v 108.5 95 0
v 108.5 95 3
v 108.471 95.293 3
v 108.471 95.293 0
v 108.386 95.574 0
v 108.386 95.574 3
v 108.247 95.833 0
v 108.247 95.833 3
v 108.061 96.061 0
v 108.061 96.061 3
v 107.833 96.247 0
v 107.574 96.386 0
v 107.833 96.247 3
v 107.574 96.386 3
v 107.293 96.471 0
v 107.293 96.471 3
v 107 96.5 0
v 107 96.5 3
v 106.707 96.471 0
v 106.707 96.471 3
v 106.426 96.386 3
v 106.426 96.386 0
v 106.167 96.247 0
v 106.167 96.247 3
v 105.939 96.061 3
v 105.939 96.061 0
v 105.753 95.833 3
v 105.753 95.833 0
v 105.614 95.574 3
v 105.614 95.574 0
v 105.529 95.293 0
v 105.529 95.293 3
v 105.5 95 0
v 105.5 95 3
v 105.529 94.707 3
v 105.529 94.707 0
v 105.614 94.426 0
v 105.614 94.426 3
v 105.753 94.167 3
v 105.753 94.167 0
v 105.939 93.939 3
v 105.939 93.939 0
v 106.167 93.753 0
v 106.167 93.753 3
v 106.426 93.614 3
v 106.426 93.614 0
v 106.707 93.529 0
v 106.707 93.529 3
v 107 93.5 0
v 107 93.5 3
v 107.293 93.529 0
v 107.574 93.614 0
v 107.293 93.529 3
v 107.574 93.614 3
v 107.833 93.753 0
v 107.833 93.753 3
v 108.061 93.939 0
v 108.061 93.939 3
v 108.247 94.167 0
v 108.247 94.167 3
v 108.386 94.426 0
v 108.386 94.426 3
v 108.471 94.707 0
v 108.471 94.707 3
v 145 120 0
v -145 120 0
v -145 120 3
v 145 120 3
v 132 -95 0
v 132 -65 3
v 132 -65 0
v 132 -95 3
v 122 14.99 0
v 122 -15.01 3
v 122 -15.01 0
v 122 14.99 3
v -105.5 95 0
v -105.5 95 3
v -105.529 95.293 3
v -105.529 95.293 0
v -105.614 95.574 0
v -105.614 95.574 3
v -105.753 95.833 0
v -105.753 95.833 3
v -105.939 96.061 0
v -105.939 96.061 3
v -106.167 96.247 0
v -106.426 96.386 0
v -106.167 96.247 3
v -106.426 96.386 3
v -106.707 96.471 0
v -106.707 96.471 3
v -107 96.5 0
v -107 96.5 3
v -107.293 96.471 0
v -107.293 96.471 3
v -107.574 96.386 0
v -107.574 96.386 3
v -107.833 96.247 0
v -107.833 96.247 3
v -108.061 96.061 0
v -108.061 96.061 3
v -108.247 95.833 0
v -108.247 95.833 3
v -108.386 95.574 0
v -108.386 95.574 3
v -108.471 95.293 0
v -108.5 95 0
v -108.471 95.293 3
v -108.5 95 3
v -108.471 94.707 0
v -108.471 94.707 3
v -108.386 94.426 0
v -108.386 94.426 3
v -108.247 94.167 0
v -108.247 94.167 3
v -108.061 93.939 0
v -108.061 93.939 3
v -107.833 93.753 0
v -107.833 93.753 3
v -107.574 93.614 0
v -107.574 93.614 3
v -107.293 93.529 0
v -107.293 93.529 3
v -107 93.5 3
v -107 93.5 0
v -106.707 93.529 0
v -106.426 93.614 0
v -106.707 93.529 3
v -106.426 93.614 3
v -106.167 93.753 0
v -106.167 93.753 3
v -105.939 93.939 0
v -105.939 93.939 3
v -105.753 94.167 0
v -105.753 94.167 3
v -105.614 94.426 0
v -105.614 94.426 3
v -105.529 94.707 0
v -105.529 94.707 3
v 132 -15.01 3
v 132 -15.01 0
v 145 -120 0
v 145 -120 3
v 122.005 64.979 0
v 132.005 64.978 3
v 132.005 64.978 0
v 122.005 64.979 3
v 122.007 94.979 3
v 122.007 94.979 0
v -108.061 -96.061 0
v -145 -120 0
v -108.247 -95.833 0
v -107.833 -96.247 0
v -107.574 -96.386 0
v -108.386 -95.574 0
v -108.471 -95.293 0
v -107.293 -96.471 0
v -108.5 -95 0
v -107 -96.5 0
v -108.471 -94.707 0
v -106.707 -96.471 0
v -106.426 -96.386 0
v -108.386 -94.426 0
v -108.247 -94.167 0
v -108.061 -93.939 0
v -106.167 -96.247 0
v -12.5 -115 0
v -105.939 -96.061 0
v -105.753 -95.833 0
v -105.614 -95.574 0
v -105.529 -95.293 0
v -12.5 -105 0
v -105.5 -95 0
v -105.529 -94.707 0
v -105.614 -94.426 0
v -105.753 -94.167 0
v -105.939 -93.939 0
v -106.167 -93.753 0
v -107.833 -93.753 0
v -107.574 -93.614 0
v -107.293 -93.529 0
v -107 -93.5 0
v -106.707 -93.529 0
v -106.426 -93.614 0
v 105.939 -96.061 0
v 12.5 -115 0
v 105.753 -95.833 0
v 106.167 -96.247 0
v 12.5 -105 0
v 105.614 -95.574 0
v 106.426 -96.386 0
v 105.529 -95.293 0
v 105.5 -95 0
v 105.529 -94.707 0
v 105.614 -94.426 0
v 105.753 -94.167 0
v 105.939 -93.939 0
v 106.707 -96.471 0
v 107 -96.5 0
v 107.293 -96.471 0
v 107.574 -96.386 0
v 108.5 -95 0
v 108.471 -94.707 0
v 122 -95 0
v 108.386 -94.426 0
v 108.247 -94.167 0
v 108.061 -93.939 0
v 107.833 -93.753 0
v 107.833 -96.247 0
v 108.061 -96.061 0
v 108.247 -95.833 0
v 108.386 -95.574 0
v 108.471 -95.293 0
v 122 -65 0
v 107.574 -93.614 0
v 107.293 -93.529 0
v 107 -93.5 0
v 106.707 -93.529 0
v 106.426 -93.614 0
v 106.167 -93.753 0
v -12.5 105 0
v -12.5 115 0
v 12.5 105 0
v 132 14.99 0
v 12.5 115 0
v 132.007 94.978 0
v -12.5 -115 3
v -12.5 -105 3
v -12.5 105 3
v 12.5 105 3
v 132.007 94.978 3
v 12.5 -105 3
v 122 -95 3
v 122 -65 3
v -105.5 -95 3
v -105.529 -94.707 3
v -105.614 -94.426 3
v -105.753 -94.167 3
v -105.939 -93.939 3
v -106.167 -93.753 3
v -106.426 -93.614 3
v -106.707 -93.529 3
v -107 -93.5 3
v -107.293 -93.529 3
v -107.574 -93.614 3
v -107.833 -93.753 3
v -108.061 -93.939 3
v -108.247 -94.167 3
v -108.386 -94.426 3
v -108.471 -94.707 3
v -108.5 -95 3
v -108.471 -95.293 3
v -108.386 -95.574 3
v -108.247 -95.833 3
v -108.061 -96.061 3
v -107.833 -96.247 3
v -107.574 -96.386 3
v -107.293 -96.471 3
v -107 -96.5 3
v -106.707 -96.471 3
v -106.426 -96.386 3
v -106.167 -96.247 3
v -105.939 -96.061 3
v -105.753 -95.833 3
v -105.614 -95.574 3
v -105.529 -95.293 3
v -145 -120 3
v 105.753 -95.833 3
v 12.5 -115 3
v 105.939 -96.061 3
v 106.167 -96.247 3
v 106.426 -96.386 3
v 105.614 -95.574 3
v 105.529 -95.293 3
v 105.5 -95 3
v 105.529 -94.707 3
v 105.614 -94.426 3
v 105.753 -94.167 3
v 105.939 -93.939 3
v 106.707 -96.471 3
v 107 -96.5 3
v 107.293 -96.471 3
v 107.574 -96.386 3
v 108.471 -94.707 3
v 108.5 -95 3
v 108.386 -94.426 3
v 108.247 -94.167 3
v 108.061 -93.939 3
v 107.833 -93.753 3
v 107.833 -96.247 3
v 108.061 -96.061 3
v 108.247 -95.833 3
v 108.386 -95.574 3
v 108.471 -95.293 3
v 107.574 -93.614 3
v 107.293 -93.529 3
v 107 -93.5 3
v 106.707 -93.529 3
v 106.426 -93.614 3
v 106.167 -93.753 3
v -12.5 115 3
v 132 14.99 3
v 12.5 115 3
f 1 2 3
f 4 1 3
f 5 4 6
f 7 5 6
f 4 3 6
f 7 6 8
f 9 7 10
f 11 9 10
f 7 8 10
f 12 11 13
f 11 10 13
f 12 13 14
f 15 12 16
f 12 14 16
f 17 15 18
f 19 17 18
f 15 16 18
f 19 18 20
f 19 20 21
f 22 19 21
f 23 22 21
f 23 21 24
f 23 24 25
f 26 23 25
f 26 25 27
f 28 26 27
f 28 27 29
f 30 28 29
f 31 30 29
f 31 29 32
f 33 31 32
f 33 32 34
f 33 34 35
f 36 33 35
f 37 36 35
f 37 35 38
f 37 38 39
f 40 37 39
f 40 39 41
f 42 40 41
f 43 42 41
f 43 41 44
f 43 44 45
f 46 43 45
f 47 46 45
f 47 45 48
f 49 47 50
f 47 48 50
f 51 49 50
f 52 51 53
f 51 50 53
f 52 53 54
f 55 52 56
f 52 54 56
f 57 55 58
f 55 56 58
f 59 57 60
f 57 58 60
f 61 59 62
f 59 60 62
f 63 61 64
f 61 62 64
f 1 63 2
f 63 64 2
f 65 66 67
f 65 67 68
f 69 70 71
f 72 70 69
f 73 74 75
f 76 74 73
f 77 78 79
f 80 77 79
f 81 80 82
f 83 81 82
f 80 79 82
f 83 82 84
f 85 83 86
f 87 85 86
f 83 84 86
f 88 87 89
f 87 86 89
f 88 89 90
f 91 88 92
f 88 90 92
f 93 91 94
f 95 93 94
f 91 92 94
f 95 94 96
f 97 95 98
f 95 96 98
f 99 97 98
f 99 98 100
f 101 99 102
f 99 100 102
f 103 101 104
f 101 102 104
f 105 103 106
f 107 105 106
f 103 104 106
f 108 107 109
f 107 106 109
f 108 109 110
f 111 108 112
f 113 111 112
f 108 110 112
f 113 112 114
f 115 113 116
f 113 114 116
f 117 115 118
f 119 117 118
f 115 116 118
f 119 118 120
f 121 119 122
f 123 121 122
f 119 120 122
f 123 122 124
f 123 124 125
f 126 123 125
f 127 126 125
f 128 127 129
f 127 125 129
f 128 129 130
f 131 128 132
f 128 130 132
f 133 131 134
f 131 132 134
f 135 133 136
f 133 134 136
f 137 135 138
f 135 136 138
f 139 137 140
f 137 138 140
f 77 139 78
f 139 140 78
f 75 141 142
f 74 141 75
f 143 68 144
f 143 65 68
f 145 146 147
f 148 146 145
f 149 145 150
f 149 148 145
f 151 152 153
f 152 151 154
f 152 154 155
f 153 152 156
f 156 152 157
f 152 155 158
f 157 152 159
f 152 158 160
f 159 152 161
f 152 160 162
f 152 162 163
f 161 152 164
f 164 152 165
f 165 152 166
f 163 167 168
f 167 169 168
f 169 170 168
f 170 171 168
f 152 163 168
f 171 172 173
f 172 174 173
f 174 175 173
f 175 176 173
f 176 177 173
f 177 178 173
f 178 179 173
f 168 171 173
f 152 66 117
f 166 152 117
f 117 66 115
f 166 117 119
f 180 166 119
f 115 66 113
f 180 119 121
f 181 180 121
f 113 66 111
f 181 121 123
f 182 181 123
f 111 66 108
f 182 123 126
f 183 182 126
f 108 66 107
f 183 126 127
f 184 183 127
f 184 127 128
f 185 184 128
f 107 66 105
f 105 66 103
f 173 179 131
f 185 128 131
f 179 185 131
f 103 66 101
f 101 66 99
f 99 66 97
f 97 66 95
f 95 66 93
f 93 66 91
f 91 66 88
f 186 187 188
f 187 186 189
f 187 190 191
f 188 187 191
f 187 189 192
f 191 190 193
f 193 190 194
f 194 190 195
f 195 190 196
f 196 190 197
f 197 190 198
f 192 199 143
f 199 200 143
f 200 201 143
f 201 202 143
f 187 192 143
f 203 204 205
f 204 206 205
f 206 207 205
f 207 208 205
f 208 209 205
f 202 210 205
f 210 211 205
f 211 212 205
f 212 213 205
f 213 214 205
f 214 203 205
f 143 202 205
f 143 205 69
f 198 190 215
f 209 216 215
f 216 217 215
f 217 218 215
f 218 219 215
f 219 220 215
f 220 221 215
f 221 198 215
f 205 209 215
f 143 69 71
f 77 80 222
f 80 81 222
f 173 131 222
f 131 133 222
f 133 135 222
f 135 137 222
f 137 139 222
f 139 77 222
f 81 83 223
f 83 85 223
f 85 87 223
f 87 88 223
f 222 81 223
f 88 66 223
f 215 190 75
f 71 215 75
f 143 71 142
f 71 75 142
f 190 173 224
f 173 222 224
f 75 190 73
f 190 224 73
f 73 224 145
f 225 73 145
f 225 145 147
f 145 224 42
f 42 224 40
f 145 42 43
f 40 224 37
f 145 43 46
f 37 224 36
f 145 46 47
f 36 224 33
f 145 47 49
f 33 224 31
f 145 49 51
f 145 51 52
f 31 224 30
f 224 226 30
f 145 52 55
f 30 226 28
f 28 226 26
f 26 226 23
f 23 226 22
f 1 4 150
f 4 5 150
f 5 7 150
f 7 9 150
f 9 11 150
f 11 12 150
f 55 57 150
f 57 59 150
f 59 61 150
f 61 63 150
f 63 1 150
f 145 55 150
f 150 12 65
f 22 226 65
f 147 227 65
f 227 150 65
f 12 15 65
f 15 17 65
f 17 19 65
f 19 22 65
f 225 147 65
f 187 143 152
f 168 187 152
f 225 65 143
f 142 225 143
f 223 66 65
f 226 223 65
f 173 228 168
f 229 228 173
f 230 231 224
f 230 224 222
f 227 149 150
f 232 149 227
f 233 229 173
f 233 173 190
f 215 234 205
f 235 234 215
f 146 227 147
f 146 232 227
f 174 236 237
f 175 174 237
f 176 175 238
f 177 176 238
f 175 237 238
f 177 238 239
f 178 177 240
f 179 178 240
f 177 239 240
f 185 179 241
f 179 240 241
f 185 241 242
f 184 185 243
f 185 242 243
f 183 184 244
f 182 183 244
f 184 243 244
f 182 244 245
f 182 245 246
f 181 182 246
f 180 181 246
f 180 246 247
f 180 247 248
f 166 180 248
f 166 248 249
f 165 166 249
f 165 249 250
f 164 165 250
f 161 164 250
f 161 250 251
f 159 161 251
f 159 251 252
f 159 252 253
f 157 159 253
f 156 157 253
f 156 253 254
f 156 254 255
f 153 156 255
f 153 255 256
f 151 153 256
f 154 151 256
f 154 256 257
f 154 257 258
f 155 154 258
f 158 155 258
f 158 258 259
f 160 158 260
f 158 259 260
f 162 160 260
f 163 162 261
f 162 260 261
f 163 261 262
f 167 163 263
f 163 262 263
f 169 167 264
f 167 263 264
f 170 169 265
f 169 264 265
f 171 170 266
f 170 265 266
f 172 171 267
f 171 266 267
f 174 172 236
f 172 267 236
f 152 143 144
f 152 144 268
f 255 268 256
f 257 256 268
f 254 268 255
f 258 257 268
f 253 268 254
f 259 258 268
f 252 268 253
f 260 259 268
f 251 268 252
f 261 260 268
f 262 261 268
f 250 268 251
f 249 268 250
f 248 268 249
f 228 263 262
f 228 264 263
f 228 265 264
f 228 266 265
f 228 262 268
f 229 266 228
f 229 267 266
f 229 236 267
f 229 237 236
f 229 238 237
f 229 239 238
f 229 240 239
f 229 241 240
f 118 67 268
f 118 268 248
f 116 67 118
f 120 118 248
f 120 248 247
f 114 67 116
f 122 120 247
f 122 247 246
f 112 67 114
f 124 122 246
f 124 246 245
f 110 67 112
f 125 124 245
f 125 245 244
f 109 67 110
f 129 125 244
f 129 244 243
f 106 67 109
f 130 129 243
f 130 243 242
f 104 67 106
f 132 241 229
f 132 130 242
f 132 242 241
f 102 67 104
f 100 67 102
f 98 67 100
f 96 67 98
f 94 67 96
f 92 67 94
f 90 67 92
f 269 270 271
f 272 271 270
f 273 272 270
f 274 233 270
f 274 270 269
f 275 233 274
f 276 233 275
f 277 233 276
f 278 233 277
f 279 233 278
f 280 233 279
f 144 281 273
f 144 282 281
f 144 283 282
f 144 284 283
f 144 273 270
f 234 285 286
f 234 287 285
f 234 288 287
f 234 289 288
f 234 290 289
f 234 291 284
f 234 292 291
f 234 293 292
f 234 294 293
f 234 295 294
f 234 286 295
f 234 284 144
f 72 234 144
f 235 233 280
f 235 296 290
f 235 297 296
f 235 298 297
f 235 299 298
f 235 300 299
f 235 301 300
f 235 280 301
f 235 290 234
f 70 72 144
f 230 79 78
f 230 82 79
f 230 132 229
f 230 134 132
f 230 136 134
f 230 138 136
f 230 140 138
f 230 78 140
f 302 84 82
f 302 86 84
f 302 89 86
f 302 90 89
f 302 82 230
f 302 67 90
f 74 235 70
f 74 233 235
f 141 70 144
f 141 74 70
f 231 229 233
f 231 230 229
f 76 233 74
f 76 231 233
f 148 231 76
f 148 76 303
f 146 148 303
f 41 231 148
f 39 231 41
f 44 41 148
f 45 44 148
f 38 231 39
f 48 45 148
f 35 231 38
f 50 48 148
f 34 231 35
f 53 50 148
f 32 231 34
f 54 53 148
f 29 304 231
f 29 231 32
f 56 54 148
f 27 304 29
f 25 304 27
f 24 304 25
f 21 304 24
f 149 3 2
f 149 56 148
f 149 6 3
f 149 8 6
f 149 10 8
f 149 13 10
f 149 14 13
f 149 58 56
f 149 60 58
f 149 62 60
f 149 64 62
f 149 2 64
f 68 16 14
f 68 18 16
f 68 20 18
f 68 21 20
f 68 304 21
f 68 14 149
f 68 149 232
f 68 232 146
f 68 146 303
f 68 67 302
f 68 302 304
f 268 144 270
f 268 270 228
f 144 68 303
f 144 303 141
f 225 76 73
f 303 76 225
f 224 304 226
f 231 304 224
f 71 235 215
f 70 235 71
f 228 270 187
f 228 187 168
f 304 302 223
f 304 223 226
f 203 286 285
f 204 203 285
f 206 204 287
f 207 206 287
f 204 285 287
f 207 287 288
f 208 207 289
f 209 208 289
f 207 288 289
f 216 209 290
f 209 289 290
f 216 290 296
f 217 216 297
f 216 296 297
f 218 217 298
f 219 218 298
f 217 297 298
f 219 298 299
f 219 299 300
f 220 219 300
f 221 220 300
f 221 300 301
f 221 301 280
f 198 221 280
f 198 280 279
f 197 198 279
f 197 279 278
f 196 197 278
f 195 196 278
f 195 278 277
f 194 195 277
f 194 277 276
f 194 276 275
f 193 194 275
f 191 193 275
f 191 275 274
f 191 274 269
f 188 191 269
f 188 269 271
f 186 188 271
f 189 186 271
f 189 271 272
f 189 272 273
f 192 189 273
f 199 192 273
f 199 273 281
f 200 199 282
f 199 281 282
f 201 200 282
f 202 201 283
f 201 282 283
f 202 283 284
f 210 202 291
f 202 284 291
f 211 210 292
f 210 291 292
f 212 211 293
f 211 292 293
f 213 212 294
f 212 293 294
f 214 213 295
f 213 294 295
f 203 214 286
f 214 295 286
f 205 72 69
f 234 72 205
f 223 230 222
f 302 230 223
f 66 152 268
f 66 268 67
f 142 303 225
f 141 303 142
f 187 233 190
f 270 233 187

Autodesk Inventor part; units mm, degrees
ref_plane "YZ Plane" through (0, 0, 0) normal (1, 0, 0) x (0, 1, 0)
ref_plane "XZ Plane" through (0, 0, 0) normal (0, 1, 0) x (-1, 0, 0)
ref_plane "XY Plane" through (0, 0, 0) normal (0, 0, 1) x (1, 0, 0)
sketch "Эскиз1" plane through (0, 0, 0) normal (0, 0, 1) x (1, 0, 0)
  line L0 (-145, 120) -> (145, 120)
  line L1 (145, 120) -> (145, -120)
  line L2 (145, -120) -> (-145, -120)
  line L3 (-145, -120) -> (-145, 120)
  line L4 (-145, 120) -> (145, -120) construction
  line L5 (145, 120) -> (-145, -120) construction
  point P0 (0, 0)
  dimension "d0" = 240
  dimension "d1" = 290
extrude "Пластина1" add sketch "Эскиз1" along normal blind 3
sketch "Эскиз2" plane through (0, 0, 3) normal (0, 0, 1) x (1, 0, 0)
  line L0 (12.5, 105) -> (-12.5, 105) projected
  line L1 (-12.5, 105) -> (-12.5, 115) projected
  line L2 (-12.5, 115) -> (12.5, 115) projected
  line L3 (12.5, 115) -> (12.5, 105) projected
  line L4 (122, -15.0105) -> (122, 14.9895) projected
  line L5 (122, 14.9895) -> (132, 14.9895) projected
  line L6 (132, 14.9895) -> (132, -15.0105) projected
  line L7 (132, -15.0105) -> (122, -15.0105) projected
  line L8 (122.0074, 94.9791) -> (132.0074, 94.9783) projected
  line L9 (132.0074, 94.9783) -> (132.0051, 64.9783) projected
  line L10 (132.0051, 64.9783) -> (122.0051, 64.9791) projected
  line L11 (122.0051, 64.9791) -> (122.0074, 94.9791) projected
  line L12 (12.5, -105) -> (12.5, -115) projected
  line L13 (12.5, -115) -> (-12.5, -115) projected
  line L14 (-12.5, -115) -> (-12.5, -105) projected
  line L15 (-12.5, -105) -> (12.5, -105) projected
  circle A0 centre (-107, 95) radius 1.5 projected
  circle A1 centre (107, -95) radius 1.5 projected
  circle A2 centre (107, 95) radius 1.5 projected
  line L16 (122, -65) -> (132, -65) projected
  line L17 (132, -65) -> (132, -95) projected
  line L18 (132, -95) -> (122, -95) projected
  line L19 (122, -95) -> (122, -65) projected
  circle A3 centre (-107, -95) radius 1.5 projected
  line L20 (-147, 125) -> (-147, -125) projected
  line L21 (-147, -125) -> (147, -125) projected
  line L22 (147, -125) -> (147, 125) projected
  line L23 (147, 125) -> (-147, 125) projected
  point P0 (0, 0)
extrude "Выдавливание1" cut sketch "Эскиз2" against normal through all contours L0 L1 L2 L3 | L4 L5 L6 L7 | L8 L9 L10 L11 | L12 L13 L14 L15 | A0 | A1 | A2 | L16 L17 L18 L19 | A3
equation "\"d2\" = Толщина"
equation "\"Радиус_гибки\" = Толщина"
equation "\"Ширина_просечки\" = Толщина"
equation "\"Глубина_просечки\" = 0.5 * Толщина"
equation "\"Размер_просечки\" = 4 * Толщина"
equation "\"Мин_остаток\" = 2 * Толщина"
equation "\"Радиус_перехода\" = Радиус_гибки"
equation "\"Радиус_Якоби\" = Радиус_гибки"
equation "\"Размер_зазора\" = Толщина"
equation "\"Толщина\" = 3"
properties part number "панель_с_электроникой"
